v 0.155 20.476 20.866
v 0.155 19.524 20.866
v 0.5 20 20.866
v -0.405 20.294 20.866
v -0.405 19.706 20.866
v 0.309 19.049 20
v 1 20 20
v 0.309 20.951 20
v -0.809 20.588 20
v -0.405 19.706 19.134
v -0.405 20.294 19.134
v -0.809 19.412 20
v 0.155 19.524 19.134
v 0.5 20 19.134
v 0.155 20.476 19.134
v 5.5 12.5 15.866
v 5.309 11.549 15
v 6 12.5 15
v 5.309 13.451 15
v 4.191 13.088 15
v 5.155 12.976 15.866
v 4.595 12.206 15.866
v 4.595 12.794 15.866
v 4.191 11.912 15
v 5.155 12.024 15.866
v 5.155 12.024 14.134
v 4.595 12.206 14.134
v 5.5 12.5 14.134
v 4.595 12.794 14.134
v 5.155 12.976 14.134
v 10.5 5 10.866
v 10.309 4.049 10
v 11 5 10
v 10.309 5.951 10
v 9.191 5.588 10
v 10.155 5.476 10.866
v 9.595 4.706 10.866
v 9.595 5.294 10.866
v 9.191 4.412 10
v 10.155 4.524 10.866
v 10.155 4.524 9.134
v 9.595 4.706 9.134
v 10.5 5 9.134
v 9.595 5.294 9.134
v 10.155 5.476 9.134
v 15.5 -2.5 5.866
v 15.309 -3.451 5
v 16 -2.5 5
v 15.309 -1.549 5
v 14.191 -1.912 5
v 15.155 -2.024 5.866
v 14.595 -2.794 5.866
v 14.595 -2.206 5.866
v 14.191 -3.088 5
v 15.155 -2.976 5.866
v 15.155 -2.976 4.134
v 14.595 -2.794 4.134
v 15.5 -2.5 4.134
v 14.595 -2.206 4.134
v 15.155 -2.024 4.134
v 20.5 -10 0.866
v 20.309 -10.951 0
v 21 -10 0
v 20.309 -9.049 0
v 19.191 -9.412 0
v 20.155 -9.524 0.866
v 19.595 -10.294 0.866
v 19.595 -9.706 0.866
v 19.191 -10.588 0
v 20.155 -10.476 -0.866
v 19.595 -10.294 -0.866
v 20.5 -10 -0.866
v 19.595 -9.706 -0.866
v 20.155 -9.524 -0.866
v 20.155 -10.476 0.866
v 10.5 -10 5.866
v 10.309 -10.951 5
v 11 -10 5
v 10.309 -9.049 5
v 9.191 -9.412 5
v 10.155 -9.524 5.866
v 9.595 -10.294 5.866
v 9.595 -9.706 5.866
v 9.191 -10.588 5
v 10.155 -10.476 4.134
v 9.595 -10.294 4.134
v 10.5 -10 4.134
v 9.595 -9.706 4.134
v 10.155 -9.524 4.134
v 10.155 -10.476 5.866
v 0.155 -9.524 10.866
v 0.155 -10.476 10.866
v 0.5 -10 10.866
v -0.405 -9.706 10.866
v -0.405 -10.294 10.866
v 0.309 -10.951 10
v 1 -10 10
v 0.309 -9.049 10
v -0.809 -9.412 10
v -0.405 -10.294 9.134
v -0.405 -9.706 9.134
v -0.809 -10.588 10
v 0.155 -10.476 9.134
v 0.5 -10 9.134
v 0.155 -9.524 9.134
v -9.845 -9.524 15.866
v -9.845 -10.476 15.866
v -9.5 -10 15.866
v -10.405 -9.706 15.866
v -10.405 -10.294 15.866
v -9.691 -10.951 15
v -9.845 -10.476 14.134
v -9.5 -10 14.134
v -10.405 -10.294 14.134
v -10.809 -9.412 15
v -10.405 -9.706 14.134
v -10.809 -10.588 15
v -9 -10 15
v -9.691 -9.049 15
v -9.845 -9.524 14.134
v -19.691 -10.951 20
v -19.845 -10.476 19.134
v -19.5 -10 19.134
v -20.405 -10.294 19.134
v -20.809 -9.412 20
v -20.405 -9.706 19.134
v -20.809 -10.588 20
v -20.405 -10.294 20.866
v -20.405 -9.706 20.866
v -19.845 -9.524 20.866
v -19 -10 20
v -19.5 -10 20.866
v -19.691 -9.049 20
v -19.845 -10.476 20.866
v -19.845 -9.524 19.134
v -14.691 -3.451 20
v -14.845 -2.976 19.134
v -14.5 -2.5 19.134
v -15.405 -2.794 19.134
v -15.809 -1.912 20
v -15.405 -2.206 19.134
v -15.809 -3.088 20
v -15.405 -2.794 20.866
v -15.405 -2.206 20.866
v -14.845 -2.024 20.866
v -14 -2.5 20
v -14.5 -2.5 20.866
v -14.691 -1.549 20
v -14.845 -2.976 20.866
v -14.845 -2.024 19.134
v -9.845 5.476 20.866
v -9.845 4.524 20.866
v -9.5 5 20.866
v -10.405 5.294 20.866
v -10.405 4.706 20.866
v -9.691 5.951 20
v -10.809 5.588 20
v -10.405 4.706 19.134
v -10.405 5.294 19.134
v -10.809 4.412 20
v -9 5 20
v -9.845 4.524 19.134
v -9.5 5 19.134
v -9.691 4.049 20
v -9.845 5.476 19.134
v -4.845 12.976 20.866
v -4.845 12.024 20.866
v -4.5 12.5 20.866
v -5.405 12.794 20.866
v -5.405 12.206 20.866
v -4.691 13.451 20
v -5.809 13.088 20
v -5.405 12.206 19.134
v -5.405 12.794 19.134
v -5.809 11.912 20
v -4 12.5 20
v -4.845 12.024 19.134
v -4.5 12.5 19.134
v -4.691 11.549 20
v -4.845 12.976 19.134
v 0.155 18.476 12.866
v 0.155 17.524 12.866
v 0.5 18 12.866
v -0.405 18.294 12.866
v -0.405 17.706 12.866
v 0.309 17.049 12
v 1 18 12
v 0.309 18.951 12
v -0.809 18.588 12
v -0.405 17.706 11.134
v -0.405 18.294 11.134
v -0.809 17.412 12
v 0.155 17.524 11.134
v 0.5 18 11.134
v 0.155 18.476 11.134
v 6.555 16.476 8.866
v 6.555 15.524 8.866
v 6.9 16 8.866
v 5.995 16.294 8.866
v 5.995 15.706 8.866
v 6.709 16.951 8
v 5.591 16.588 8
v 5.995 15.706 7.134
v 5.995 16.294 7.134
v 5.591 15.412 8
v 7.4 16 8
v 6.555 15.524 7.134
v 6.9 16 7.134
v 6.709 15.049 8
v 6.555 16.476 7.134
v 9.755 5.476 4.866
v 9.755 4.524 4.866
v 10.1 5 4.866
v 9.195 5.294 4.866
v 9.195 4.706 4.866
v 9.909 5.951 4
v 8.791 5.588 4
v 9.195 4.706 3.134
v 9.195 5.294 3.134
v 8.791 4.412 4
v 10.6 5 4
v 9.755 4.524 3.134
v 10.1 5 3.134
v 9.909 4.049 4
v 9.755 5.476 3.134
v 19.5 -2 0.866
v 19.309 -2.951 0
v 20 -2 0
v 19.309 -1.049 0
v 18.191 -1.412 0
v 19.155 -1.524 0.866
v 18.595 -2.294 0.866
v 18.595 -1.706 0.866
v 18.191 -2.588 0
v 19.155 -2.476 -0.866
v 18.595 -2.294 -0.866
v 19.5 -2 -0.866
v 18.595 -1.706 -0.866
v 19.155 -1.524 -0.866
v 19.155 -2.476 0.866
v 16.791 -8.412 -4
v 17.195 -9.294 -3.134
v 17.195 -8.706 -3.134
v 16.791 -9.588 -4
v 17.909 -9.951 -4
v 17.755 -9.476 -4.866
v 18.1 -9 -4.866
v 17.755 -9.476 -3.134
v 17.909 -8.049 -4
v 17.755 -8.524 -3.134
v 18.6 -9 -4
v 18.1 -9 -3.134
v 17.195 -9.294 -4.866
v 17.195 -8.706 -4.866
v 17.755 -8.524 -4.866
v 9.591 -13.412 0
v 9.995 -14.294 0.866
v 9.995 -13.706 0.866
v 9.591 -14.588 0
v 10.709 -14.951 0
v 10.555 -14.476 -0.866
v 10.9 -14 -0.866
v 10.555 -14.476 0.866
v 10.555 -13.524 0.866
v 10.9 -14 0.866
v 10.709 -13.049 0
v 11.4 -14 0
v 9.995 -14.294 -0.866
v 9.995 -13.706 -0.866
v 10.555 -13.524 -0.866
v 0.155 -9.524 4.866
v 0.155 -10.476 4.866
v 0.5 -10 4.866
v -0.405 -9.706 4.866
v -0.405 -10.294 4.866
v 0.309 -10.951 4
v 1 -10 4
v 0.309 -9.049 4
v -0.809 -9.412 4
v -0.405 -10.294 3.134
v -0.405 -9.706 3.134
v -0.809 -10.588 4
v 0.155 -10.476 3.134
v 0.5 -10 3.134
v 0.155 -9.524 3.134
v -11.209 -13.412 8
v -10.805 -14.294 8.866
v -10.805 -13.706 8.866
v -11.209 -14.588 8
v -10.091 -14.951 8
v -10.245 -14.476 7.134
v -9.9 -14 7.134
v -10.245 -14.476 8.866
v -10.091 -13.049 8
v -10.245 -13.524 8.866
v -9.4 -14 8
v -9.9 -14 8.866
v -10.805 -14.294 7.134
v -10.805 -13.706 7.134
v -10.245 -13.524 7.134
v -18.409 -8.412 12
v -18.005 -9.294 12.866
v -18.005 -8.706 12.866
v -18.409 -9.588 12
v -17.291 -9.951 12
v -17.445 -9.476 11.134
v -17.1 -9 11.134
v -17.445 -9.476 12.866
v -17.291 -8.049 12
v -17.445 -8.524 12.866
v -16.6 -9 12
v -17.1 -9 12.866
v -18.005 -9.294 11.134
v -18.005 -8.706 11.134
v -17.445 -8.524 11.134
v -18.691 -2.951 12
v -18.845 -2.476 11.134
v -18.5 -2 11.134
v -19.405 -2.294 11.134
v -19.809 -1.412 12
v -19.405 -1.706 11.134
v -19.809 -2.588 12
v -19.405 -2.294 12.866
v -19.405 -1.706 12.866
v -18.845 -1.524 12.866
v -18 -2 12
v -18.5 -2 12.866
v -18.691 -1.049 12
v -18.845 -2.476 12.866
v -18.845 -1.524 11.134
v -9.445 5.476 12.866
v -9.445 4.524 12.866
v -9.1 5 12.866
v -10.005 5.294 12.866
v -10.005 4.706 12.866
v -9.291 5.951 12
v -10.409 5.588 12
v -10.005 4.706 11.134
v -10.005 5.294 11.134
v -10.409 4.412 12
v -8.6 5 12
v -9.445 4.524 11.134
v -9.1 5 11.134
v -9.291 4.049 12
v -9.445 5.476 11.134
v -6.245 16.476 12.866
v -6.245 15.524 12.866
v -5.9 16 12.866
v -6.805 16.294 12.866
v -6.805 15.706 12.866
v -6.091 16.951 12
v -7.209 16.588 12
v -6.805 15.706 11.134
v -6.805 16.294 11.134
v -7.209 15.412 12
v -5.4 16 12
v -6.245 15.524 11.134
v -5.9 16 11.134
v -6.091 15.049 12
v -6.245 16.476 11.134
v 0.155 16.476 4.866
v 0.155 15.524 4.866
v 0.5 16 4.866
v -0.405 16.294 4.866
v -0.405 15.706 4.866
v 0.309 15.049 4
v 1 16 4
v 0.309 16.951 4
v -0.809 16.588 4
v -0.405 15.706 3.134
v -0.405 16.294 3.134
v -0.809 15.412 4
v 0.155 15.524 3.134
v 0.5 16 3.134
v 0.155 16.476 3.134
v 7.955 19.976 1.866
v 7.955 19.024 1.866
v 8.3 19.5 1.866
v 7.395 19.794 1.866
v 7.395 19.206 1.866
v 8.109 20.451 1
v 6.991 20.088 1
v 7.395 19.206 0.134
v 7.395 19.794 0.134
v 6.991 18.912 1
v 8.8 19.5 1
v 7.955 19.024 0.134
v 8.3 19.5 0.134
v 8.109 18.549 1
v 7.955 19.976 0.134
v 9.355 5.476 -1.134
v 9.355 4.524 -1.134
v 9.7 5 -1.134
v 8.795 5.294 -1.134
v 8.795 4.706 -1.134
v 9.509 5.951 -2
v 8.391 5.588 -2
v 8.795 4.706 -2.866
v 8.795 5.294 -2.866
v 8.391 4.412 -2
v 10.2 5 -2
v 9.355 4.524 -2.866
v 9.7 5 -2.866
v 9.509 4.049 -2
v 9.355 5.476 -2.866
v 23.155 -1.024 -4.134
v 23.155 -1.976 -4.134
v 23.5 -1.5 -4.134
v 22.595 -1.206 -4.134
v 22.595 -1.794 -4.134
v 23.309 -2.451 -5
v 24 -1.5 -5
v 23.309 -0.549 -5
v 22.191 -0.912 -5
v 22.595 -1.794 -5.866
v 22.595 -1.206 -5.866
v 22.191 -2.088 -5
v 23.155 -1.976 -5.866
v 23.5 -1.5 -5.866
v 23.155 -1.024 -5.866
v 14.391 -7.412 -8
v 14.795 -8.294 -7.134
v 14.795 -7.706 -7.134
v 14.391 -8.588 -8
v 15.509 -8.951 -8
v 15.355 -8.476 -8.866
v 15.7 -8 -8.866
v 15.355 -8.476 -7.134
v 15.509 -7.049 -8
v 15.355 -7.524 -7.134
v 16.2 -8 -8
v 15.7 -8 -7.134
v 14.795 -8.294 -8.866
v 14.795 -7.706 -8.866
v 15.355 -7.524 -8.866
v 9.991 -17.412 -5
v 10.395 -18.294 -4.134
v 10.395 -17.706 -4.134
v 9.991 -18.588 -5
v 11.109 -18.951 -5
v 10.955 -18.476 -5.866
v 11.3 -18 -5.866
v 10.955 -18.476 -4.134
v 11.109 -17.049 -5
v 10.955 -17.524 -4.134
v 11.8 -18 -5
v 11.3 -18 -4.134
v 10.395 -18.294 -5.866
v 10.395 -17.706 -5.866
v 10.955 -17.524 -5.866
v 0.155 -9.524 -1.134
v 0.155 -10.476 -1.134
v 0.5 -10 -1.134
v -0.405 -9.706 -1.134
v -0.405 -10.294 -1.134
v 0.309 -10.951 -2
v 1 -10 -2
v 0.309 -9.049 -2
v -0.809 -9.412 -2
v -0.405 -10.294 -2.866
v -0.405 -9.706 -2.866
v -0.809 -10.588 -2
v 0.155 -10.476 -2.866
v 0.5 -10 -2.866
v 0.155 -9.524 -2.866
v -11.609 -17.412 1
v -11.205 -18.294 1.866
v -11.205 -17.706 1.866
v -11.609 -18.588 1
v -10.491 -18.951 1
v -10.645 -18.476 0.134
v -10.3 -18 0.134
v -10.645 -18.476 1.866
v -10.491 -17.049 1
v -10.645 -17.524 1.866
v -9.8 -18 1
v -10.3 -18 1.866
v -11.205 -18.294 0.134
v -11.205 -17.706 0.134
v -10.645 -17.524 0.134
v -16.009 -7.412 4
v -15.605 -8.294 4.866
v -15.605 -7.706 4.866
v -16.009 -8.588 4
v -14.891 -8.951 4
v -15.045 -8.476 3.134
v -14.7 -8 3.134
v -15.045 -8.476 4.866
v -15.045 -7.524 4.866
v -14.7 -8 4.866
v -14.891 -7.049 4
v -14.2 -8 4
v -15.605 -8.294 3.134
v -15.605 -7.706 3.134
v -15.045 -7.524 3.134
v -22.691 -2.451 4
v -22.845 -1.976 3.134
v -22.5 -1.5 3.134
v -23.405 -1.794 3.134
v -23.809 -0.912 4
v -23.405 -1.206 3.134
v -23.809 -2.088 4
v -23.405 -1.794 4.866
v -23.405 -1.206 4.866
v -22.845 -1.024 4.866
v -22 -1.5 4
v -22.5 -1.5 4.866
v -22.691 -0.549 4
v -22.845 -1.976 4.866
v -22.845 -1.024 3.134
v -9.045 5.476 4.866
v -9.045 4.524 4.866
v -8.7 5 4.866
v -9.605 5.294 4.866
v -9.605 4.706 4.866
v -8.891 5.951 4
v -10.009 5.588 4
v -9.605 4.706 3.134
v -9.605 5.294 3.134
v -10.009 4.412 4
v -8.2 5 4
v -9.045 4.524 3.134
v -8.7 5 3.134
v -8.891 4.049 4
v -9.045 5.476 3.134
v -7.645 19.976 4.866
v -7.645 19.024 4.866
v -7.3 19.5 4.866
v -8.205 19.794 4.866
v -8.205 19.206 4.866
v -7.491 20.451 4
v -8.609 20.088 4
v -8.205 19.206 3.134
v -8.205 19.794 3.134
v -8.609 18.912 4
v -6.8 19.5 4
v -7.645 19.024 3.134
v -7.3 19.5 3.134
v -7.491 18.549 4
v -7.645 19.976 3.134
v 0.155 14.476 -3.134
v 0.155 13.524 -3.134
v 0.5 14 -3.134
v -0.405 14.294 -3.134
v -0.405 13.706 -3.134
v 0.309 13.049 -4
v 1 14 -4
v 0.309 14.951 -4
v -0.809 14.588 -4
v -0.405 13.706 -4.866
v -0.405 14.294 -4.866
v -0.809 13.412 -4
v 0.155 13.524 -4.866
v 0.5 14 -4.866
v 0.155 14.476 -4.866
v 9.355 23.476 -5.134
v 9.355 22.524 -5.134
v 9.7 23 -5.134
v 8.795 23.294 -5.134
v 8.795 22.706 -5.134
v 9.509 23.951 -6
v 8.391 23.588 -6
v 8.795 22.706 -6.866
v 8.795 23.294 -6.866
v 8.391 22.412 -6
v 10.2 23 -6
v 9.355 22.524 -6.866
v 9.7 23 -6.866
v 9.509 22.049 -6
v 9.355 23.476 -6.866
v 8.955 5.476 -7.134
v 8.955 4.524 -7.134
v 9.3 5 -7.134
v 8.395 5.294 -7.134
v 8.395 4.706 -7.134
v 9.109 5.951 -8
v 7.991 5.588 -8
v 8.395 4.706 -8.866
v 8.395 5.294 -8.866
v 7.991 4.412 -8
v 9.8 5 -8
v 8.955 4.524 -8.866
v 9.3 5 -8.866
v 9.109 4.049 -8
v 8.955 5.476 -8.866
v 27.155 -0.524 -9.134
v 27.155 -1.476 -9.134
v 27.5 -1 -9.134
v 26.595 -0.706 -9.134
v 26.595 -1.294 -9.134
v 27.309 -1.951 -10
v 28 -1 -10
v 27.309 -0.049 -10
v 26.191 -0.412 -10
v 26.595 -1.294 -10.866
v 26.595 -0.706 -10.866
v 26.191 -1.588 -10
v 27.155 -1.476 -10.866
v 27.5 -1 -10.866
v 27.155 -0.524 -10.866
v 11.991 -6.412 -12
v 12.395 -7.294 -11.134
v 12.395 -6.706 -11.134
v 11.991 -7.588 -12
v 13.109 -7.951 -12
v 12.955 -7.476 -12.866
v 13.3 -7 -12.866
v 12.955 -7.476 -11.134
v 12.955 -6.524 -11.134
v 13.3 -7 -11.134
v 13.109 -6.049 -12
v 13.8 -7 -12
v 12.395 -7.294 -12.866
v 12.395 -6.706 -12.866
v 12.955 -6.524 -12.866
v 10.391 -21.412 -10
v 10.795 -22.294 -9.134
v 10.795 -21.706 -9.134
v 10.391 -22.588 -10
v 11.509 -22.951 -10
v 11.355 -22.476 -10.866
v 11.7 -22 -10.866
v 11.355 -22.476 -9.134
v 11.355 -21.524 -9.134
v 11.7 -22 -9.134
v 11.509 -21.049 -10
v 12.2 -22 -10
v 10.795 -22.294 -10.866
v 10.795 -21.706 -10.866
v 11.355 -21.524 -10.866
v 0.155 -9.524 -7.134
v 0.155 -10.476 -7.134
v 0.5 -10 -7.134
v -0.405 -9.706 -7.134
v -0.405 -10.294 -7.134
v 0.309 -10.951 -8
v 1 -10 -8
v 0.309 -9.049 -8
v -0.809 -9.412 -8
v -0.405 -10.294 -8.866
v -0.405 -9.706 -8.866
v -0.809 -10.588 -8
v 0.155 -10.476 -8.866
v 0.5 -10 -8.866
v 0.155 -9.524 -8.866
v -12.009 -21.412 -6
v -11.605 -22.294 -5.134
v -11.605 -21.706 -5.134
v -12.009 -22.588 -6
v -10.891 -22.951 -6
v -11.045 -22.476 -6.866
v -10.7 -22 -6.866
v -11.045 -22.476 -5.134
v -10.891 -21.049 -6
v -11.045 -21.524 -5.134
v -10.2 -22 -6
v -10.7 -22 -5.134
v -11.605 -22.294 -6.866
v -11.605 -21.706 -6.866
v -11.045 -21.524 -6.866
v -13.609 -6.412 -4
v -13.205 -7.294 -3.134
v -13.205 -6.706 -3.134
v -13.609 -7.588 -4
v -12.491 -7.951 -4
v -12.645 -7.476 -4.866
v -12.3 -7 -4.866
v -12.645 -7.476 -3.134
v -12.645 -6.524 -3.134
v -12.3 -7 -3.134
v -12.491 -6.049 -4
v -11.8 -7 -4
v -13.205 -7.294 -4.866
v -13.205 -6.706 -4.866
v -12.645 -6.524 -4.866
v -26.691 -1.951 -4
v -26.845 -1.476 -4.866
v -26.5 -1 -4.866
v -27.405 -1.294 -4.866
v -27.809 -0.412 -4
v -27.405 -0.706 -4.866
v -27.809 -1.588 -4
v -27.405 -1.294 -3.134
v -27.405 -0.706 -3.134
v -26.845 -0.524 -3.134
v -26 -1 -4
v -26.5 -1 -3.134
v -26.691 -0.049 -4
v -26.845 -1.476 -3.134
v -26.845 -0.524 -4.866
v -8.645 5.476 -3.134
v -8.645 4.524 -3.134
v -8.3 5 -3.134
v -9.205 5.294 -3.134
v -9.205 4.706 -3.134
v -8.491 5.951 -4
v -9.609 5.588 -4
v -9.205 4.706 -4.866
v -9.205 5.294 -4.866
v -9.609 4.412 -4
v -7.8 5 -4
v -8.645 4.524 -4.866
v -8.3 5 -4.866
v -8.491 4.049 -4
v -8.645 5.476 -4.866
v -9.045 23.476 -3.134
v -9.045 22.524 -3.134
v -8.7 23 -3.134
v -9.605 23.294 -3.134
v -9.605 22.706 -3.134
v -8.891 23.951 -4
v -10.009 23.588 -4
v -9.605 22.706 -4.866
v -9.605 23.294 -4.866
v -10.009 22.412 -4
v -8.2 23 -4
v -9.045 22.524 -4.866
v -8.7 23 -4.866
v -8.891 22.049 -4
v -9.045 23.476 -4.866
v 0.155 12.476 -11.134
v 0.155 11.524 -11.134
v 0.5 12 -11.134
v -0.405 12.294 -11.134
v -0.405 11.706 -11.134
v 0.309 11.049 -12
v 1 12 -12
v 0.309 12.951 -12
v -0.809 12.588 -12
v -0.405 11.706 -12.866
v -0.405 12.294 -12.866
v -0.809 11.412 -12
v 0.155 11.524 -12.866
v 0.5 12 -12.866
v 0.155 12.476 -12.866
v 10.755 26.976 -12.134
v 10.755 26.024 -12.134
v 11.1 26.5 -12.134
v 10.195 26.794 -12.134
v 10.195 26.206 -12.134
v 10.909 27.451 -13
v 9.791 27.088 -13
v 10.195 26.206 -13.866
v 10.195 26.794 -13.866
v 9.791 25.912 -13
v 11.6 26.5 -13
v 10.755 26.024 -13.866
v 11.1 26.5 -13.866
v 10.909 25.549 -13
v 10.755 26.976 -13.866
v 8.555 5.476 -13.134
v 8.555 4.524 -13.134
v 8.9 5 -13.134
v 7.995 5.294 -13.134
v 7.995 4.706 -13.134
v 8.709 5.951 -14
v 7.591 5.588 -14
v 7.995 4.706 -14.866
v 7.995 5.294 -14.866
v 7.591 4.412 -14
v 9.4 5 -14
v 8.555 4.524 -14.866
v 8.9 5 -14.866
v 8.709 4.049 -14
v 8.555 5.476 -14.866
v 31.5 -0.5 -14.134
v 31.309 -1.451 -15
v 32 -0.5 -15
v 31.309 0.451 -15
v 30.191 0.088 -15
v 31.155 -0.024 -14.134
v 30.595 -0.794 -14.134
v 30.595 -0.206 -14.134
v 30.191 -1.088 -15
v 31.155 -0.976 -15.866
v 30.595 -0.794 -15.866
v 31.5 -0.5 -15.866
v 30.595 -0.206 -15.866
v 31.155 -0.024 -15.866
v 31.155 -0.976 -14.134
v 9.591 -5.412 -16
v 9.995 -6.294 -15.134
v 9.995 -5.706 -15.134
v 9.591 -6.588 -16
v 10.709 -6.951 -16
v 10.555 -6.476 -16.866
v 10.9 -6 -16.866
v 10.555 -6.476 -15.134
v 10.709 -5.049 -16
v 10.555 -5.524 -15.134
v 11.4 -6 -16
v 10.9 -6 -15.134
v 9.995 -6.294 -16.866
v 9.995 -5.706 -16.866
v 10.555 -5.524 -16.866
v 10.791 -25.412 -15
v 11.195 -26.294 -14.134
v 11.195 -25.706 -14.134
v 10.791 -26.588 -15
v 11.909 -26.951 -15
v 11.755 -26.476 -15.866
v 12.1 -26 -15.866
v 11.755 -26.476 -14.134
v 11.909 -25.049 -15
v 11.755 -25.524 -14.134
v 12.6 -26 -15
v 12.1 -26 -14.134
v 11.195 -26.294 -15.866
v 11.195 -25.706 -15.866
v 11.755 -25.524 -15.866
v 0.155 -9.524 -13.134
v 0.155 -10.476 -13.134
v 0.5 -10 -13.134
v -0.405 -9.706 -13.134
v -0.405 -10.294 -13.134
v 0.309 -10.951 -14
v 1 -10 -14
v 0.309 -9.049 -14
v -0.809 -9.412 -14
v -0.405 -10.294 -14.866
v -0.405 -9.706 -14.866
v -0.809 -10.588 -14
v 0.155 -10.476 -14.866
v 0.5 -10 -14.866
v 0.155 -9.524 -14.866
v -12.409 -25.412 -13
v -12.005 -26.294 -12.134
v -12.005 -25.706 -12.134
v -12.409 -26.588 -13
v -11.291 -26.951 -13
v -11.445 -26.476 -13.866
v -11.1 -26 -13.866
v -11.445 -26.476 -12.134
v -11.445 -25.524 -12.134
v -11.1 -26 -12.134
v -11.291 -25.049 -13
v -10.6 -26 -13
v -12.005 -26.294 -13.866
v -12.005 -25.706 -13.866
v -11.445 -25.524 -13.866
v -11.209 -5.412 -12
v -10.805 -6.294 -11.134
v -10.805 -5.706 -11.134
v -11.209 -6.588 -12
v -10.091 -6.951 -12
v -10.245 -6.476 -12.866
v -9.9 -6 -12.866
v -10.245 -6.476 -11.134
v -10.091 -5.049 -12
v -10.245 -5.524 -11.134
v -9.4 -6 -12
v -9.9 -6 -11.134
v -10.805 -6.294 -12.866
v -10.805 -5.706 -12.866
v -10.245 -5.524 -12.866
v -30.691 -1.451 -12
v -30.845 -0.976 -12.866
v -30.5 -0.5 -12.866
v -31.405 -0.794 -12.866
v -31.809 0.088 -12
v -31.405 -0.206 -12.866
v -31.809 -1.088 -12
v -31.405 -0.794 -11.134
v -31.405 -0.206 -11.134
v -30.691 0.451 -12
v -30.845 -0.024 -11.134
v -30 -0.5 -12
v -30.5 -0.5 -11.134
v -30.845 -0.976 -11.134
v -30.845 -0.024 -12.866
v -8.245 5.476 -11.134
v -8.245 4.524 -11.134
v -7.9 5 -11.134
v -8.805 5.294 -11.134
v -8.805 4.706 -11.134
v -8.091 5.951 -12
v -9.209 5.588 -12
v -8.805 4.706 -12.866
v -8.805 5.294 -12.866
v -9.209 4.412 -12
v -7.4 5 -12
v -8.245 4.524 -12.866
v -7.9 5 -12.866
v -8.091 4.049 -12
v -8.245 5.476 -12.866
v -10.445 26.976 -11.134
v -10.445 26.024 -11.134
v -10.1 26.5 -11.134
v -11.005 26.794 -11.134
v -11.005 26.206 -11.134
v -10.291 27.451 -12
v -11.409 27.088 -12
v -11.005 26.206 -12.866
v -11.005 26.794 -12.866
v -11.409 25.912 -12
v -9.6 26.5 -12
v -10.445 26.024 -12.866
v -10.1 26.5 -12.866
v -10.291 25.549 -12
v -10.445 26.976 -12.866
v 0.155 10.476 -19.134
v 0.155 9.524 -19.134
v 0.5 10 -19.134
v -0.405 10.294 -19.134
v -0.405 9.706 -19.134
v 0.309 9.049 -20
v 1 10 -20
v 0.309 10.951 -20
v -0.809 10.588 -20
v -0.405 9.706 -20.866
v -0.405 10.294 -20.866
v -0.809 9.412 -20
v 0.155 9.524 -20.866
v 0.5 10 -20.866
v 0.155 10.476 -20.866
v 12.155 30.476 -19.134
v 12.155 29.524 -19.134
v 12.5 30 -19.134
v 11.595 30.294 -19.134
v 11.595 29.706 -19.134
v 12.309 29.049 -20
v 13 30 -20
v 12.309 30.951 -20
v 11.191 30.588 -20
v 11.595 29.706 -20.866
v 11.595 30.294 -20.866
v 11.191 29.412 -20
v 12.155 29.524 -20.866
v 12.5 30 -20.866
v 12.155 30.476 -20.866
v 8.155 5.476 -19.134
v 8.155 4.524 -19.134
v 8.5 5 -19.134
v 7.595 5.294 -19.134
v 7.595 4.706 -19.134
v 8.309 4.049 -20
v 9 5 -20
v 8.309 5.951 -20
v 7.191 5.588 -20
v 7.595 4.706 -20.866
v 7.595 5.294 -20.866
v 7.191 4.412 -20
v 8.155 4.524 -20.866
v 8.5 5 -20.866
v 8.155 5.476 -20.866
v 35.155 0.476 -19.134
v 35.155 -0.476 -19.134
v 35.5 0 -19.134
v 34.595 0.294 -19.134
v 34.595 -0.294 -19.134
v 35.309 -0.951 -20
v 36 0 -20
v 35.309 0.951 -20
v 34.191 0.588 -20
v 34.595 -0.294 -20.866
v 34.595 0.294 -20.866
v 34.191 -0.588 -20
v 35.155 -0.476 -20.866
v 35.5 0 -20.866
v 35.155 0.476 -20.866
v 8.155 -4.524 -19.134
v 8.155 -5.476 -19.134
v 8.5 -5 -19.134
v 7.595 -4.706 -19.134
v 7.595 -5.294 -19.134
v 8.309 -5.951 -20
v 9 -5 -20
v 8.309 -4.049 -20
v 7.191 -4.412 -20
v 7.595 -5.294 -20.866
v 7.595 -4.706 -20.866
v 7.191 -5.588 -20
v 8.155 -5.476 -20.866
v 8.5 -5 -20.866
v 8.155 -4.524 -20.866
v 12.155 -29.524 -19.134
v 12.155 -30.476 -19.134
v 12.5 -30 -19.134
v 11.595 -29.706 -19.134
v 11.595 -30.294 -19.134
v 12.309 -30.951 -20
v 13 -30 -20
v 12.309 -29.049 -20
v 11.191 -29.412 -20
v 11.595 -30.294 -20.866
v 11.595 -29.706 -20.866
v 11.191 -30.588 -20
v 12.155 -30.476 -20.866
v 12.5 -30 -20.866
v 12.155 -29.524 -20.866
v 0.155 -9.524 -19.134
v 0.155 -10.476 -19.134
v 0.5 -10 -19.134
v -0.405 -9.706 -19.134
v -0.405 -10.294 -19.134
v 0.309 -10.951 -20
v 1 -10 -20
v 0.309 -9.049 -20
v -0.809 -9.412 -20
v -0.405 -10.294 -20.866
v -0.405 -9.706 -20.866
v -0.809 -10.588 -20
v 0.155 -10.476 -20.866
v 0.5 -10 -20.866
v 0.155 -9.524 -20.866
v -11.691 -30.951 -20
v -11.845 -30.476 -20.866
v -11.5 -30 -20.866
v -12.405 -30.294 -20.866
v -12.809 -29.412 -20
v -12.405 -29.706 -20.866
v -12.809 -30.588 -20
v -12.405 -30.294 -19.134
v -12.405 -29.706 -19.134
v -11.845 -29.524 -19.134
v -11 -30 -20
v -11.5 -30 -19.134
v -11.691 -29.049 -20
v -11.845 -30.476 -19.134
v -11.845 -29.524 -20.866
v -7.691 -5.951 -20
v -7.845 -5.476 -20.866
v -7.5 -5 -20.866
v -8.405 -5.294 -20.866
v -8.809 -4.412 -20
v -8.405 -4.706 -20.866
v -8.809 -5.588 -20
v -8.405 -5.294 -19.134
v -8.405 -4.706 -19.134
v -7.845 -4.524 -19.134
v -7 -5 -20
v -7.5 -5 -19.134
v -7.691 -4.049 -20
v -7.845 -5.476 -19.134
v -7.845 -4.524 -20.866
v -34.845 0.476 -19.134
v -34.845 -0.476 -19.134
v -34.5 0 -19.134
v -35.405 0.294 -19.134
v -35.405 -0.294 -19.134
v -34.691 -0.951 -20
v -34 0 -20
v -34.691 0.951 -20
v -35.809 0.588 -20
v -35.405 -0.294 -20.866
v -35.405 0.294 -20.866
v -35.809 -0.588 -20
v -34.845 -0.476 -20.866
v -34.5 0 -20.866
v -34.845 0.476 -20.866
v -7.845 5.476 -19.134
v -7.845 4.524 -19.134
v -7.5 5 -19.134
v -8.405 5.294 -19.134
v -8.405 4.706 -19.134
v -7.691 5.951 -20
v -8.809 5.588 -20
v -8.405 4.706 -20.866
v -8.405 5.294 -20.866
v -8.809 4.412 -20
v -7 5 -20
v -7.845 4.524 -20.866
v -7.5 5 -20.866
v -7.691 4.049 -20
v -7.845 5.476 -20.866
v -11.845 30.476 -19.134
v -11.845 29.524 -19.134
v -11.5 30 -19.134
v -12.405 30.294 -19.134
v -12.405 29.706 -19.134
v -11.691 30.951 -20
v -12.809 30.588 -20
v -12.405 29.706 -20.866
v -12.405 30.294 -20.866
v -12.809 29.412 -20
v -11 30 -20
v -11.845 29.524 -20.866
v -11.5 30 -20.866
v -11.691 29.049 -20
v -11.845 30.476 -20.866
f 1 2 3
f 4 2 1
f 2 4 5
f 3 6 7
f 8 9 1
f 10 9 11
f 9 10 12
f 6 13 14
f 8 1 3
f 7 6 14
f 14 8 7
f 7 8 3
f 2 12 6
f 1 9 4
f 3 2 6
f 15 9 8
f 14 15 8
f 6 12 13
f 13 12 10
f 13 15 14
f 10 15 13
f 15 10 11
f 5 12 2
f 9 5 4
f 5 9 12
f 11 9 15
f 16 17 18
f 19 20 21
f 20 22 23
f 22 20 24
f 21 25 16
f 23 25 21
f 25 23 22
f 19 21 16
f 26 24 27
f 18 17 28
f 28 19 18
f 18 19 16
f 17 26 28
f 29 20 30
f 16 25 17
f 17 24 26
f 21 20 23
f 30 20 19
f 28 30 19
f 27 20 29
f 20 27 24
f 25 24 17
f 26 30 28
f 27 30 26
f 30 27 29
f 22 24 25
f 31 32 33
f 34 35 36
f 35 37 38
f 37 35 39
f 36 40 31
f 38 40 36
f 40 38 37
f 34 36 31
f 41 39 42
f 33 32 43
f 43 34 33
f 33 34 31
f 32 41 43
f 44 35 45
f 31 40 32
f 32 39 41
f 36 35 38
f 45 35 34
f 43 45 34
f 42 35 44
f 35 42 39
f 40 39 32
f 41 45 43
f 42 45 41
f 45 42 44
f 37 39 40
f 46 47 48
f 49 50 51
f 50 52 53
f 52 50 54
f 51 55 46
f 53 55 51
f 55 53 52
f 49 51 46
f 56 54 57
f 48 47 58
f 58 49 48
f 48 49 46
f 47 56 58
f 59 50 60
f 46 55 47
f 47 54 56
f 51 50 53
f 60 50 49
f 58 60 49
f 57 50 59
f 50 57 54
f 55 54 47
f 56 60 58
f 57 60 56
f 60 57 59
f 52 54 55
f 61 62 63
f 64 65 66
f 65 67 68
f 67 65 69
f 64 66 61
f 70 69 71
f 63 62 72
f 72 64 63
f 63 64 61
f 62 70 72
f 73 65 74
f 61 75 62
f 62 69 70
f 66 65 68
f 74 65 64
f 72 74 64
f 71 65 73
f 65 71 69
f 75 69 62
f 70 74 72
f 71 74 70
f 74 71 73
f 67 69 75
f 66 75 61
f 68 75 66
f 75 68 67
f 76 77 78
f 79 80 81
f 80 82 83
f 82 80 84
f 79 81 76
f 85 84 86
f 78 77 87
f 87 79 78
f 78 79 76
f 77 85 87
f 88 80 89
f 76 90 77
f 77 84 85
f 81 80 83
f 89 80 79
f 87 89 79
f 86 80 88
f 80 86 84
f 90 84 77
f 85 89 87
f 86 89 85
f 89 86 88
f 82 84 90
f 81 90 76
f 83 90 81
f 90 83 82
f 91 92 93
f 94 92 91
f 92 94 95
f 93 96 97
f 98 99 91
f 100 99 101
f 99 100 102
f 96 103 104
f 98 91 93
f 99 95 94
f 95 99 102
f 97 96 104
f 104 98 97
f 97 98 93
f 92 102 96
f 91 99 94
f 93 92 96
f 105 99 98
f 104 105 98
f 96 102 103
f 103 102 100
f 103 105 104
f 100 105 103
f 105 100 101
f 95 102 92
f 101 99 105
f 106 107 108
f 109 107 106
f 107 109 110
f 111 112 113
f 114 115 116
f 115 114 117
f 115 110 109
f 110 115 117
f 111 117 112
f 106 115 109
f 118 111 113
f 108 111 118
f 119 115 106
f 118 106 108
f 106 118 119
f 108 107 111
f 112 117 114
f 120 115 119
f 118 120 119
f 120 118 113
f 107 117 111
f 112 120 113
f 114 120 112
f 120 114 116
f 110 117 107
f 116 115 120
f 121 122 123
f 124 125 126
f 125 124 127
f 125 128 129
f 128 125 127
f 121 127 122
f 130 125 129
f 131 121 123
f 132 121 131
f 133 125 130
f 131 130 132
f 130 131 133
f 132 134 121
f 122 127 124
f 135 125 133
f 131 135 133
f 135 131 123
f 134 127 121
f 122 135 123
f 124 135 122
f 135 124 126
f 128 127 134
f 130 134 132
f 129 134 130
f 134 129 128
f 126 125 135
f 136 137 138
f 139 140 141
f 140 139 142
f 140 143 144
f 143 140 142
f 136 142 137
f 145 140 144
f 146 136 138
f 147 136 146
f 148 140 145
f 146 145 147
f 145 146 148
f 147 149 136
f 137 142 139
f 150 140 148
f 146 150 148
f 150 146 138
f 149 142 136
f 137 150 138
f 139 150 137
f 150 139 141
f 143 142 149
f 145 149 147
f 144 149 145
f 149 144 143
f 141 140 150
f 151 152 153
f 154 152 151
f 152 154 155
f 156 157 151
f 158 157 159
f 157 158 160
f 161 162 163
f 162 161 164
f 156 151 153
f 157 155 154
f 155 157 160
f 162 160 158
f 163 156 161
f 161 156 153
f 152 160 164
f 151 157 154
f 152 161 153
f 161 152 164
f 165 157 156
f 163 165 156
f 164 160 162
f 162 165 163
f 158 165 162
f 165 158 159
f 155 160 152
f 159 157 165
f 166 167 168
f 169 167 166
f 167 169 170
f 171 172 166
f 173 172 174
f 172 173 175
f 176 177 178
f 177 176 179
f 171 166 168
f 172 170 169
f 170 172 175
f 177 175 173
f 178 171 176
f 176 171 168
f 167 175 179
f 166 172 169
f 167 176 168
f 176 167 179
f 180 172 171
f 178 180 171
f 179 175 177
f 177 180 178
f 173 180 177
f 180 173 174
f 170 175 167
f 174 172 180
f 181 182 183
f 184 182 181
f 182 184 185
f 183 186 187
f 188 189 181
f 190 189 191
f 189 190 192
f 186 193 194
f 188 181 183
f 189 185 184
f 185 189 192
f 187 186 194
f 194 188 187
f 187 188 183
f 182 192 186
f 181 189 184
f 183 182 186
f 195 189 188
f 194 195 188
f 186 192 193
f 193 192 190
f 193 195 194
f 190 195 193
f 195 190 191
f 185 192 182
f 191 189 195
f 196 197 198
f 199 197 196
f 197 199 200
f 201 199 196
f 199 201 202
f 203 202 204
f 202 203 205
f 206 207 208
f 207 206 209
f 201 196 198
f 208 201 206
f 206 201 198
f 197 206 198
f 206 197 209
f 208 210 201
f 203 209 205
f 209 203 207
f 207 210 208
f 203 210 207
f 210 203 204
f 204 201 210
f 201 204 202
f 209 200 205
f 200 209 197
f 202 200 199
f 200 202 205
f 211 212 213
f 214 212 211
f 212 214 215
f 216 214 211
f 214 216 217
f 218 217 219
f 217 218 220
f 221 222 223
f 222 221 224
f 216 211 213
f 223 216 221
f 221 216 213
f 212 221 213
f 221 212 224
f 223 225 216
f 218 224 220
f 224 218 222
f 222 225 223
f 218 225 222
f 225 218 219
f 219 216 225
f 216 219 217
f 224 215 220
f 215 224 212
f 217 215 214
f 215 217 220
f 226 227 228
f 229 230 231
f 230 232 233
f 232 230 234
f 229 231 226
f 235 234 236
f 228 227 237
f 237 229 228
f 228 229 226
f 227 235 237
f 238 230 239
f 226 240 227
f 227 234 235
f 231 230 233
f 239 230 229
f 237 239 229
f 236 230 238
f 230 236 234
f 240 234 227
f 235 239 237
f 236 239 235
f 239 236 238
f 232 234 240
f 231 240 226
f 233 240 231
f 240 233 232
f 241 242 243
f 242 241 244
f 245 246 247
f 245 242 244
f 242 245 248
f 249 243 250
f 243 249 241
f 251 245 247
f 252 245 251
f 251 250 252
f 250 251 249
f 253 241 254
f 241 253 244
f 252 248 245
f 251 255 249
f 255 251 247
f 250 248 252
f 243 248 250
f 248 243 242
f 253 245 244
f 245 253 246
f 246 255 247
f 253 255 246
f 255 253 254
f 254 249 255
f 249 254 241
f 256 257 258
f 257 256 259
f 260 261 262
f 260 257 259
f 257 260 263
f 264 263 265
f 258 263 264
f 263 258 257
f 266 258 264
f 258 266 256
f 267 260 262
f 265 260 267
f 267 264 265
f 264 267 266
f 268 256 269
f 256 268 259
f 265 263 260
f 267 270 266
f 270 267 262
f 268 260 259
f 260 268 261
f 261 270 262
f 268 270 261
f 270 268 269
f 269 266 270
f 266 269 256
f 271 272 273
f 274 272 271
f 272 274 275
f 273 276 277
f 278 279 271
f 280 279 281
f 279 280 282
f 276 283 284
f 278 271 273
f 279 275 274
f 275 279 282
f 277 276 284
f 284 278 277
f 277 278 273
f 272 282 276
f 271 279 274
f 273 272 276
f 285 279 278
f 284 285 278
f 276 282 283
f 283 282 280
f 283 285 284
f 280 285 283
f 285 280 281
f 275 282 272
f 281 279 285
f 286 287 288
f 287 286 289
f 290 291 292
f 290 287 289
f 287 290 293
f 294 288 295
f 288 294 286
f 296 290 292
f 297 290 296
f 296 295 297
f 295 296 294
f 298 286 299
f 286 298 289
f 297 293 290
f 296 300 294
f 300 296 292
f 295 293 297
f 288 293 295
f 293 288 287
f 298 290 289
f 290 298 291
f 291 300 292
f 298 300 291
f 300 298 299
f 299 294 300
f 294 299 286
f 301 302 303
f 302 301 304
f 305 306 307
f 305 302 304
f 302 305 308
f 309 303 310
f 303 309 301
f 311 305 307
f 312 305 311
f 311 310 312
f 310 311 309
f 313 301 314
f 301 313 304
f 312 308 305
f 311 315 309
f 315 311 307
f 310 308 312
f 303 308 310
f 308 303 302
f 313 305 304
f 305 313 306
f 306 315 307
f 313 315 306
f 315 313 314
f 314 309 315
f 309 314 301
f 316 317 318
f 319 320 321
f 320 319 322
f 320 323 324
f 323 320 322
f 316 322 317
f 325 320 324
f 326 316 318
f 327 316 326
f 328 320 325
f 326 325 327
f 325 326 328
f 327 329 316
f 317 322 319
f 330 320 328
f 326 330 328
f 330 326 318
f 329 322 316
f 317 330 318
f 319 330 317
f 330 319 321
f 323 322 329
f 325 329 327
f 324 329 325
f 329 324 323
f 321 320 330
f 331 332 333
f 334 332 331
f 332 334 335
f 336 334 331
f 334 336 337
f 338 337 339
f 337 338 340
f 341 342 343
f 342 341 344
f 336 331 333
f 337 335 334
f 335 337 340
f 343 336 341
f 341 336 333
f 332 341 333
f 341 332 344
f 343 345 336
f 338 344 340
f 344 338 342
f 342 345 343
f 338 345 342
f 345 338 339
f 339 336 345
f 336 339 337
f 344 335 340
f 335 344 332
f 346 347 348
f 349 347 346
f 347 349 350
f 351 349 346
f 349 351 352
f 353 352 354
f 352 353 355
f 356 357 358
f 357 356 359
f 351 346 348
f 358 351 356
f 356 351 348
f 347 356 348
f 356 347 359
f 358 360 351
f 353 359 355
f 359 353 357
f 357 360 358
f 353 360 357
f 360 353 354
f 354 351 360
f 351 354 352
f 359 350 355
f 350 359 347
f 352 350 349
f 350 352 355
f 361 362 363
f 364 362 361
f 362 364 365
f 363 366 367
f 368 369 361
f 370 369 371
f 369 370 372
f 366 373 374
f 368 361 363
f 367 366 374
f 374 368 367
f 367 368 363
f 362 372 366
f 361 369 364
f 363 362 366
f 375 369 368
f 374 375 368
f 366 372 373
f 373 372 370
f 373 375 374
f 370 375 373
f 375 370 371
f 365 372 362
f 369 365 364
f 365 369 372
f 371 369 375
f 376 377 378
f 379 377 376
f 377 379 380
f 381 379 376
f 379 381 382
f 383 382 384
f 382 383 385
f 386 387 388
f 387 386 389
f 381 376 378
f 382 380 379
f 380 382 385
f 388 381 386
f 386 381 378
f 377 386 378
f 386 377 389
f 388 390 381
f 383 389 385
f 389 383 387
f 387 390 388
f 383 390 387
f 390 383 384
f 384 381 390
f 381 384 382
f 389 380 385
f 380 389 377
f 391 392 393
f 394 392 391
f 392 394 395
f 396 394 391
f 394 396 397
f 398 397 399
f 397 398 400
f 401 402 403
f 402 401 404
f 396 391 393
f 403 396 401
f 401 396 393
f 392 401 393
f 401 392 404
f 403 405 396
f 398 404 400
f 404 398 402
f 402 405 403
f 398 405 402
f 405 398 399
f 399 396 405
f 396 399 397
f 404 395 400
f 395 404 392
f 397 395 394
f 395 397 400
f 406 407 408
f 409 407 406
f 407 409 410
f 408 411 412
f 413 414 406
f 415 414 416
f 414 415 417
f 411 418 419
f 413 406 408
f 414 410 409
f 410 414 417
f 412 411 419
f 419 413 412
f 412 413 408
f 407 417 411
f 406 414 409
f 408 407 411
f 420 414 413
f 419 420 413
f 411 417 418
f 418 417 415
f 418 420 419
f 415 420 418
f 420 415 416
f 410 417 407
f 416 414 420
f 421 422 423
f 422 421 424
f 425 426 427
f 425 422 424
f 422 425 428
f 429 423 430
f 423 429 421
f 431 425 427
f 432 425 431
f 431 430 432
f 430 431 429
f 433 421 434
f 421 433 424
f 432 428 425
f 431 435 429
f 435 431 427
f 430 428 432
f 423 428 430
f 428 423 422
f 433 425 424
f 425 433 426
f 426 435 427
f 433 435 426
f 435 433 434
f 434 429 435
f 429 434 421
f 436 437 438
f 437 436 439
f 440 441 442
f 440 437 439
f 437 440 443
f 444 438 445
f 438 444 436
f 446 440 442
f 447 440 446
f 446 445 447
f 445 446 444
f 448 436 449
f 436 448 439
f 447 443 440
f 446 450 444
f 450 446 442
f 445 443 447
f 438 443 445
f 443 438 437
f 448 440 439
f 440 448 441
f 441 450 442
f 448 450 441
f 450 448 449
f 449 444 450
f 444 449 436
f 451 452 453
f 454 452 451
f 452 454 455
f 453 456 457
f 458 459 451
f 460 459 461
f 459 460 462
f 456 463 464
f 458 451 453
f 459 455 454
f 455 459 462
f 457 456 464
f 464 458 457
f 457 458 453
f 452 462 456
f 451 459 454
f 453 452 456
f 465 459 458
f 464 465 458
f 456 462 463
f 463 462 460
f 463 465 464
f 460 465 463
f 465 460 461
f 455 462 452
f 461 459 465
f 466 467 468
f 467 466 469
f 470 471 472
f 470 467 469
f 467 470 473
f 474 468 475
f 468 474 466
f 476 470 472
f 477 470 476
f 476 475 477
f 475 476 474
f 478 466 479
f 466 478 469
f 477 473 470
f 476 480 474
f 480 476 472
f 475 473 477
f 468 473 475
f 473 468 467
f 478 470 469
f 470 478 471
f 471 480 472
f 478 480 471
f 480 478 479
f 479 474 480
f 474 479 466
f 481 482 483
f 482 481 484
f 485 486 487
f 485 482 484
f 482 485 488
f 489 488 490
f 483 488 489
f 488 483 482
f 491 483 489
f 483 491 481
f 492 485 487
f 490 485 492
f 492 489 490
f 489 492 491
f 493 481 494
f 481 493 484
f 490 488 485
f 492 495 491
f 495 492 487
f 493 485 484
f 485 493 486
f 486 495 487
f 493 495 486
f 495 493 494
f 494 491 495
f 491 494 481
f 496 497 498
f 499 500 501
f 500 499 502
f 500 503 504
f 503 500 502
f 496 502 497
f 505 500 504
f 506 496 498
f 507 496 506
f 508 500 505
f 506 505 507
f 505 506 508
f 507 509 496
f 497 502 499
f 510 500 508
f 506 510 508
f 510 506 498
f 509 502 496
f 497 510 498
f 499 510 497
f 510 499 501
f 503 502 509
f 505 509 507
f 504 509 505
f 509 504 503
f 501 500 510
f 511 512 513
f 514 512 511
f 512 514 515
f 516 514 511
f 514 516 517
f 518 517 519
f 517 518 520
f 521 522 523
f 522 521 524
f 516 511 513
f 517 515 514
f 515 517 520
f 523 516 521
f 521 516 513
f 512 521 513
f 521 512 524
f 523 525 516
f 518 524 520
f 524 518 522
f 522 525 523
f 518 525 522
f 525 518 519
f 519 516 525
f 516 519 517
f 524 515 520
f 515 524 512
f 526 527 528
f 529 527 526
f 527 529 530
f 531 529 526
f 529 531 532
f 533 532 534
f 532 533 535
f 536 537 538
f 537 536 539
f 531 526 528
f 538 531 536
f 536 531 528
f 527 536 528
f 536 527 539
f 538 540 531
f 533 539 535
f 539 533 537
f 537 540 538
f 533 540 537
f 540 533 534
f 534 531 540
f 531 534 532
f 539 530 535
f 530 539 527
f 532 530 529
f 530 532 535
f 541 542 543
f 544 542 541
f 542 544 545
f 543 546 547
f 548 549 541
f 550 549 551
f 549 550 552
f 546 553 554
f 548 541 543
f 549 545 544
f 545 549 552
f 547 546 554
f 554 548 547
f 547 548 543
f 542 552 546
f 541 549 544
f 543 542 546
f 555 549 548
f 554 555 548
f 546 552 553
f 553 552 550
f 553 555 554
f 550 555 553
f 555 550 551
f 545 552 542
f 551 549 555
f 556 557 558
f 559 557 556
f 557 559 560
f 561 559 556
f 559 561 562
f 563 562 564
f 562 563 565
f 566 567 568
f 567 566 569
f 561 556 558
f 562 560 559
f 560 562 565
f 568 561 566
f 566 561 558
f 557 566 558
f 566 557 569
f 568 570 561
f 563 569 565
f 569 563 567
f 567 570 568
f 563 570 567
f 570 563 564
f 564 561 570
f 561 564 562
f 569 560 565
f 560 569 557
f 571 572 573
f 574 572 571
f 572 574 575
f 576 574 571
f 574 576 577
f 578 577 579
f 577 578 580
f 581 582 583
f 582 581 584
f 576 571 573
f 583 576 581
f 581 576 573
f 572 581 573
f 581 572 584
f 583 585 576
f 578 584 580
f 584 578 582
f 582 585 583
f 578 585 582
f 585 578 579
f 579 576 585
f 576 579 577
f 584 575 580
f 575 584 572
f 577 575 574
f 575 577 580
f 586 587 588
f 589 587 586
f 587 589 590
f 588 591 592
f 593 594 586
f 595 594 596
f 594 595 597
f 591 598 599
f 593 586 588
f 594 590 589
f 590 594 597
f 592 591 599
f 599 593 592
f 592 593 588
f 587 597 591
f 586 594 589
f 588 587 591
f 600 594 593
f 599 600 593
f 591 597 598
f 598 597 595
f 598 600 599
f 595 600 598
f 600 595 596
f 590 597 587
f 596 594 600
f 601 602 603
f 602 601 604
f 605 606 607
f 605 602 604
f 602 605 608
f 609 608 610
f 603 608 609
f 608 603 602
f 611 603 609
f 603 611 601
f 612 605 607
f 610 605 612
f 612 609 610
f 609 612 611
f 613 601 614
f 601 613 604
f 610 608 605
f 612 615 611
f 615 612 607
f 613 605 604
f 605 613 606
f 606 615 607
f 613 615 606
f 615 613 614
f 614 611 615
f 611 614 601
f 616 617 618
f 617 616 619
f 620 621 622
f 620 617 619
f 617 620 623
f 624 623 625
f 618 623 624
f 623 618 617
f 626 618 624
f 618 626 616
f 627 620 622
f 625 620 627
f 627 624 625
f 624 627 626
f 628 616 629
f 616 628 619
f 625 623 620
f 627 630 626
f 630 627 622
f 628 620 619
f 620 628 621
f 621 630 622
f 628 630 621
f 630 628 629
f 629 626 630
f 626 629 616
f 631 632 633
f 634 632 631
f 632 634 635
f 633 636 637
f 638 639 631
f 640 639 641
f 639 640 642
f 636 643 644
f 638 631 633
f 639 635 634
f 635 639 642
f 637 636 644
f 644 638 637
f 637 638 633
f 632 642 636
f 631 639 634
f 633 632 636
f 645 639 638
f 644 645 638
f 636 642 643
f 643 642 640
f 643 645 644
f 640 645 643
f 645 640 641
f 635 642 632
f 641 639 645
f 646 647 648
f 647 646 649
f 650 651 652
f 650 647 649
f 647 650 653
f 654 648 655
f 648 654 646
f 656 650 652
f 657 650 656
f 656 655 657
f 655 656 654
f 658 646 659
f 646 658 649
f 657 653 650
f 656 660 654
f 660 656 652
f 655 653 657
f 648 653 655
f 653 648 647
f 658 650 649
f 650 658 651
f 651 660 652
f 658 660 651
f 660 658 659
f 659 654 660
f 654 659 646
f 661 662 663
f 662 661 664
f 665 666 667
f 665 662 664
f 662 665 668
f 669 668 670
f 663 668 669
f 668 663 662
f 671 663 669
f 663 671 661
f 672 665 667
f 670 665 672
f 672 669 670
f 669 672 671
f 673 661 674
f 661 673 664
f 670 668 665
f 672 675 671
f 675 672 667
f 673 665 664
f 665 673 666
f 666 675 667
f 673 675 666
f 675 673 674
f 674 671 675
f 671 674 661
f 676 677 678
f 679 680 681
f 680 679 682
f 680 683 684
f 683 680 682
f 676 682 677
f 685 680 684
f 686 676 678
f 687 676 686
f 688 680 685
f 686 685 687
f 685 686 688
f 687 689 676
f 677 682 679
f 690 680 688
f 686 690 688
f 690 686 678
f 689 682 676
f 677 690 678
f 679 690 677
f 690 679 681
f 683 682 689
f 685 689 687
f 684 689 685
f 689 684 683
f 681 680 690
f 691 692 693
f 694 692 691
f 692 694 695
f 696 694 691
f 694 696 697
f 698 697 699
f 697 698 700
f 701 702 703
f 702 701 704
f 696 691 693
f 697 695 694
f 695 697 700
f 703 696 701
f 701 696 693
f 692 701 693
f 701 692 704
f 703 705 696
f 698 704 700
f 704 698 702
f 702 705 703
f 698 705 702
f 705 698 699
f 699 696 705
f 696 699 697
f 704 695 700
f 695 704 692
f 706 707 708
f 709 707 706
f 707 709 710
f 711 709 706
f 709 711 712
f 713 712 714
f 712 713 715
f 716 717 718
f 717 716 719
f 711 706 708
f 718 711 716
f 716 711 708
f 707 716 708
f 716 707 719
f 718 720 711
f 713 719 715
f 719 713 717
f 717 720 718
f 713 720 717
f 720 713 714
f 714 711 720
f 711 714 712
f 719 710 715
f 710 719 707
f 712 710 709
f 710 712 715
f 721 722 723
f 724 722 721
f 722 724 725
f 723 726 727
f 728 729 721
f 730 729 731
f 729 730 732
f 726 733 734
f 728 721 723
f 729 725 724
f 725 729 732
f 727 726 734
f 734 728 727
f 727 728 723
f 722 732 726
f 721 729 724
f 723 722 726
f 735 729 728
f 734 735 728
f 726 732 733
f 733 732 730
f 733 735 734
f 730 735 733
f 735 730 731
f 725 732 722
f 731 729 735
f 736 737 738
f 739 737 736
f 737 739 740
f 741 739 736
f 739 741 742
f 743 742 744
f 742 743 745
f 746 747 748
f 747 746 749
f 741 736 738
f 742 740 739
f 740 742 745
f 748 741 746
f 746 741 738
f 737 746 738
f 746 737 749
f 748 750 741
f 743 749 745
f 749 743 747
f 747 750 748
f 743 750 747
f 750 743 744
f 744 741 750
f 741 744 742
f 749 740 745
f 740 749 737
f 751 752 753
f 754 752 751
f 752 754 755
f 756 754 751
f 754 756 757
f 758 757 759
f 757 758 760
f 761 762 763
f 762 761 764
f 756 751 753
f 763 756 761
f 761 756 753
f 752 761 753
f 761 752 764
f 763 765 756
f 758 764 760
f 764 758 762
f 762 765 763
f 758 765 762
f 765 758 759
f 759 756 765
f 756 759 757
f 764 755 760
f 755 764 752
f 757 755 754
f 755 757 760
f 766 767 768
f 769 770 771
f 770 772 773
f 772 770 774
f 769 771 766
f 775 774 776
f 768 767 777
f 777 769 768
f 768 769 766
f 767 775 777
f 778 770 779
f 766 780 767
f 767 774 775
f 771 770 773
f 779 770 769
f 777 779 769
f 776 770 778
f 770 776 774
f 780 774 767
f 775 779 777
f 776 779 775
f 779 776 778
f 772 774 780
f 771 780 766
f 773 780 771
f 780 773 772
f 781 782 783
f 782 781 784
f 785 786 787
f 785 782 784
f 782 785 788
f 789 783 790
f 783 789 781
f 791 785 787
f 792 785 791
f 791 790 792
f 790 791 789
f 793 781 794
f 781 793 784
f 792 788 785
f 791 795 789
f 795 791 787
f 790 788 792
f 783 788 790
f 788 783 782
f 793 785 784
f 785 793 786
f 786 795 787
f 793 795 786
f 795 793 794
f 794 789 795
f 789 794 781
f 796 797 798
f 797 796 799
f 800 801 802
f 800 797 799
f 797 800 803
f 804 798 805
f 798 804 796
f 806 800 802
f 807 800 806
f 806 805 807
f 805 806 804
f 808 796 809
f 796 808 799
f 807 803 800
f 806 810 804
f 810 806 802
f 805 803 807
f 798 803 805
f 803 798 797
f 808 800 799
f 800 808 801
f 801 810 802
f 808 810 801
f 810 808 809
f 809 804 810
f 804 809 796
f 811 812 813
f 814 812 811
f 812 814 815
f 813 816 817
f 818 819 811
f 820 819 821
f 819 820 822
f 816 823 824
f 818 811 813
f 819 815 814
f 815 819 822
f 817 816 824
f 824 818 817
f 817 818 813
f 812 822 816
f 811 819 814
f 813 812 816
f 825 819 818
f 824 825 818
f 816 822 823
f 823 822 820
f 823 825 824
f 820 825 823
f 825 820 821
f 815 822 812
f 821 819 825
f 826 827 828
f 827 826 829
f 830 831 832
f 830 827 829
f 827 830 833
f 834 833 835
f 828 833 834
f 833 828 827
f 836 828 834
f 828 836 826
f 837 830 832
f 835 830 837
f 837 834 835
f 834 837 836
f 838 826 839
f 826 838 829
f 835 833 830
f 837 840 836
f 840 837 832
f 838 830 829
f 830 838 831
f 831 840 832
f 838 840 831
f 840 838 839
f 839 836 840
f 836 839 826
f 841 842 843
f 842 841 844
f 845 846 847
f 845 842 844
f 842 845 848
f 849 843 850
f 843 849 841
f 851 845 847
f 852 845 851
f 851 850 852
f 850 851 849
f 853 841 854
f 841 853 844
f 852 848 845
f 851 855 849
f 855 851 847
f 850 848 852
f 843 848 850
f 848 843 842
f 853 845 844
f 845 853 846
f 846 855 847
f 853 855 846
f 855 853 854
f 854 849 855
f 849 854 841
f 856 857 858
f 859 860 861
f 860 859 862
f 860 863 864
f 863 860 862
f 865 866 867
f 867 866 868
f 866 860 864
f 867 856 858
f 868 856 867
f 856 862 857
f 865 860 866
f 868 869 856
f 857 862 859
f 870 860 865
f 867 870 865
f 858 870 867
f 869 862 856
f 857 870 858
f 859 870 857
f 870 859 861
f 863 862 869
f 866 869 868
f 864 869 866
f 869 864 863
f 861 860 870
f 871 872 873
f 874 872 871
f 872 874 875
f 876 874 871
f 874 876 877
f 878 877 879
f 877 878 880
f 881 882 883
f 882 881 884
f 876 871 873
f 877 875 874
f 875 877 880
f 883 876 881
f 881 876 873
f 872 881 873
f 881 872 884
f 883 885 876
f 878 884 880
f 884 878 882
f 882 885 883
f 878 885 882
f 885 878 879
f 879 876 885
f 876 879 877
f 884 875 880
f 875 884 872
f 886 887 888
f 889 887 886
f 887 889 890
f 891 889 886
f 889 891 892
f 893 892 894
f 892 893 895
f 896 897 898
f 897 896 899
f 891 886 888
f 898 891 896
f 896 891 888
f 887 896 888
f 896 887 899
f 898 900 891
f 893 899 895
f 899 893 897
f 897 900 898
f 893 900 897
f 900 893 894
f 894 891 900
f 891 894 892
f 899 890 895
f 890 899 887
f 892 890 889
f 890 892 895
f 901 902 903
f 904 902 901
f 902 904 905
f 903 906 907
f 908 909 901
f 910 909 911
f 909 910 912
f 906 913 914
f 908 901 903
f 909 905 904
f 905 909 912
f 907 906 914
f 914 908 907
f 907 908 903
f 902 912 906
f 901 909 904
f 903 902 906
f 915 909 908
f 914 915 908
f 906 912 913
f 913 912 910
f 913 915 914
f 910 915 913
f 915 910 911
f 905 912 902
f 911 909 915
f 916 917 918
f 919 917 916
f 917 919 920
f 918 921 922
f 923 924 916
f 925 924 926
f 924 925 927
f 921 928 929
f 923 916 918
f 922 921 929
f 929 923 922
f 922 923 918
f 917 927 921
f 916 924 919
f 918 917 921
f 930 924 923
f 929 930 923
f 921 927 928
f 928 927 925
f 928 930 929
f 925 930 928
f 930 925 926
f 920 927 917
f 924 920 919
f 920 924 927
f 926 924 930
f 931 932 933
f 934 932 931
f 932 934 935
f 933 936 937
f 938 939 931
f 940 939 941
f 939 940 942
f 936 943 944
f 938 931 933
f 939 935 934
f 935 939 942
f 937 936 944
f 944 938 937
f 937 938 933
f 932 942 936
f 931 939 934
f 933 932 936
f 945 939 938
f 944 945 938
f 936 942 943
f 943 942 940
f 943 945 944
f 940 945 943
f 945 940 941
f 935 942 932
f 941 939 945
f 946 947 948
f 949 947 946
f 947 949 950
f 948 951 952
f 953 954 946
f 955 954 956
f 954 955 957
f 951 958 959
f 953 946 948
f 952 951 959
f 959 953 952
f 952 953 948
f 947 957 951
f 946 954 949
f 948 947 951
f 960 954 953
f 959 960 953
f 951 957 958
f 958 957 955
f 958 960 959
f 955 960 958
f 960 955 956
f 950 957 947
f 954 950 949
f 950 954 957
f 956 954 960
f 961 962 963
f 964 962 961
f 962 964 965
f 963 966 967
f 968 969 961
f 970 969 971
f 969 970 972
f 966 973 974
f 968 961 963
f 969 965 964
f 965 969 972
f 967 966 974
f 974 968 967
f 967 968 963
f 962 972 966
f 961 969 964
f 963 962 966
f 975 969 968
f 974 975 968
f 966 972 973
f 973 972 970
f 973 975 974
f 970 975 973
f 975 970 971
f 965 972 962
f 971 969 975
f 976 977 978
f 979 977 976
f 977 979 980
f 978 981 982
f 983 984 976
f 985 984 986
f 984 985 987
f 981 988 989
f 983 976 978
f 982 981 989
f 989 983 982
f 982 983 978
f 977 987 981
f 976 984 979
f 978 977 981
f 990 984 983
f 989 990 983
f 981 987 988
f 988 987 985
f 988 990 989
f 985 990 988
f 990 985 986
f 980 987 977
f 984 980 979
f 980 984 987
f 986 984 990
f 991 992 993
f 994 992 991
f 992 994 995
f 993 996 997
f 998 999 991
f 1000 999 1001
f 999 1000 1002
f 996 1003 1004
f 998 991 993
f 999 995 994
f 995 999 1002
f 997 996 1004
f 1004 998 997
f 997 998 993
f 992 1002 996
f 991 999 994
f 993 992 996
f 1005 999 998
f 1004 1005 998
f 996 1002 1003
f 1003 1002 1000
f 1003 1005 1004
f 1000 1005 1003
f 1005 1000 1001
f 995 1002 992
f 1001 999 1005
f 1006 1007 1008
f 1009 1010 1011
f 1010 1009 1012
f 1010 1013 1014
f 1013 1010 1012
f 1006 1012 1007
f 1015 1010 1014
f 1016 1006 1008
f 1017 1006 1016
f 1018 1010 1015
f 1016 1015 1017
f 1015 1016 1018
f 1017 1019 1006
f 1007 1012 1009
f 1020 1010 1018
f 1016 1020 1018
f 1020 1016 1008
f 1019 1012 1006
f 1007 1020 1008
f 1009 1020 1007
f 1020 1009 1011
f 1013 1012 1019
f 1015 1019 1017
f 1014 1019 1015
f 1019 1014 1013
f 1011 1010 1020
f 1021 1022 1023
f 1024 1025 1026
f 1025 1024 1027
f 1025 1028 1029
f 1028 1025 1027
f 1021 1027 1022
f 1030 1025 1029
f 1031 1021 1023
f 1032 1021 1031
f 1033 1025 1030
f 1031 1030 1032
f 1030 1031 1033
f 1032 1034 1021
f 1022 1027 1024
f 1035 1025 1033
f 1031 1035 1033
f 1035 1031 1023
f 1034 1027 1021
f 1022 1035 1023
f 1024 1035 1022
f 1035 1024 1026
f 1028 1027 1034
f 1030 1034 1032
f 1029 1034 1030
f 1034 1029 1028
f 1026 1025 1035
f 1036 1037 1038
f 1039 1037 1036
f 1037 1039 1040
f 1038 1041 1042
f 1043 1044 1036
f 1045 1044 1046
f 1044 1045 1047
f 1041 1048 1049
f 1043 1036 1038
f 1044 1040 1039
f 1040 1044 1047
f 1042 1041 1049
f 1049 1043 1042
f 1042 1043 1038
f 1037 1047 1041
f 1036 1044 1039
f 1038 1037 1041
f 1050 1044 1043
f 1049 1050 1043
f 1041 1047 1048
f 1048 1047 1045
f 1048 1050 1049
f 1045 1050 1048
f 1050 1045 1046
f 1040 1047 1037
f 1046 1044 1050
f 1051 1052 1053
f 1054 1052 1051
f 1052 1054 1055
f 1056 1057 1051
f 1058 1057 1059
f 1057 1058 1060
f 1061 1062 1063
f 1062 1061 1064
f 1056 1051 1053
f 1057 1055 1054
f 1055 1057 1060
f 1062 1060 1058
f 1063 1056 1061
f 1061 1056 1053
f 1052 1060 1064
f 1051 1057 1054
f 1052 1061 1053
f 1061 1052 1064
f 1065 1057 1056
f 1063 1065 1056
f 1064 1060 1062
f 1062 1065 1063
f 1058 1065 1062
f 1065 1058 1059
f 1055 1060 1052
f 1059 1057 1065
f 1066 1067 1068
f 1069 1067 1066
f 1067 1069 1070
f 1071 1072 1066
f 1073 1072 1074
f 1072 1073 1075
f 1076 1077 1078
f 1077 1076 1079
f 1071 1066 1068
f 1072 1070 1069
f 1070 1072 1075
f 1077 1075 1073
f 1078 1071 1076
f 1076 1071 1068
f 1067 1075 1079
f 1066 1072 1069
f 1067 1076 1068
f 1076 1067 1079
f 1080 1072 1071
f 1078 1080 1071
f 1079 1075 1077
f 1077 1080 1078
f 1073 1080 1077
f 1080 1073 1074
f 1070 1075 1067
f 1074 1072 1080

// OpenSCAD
// OpenSCAD loft demo, with n layers.

// Add the same amount of points for upper and lower face,
// preferably clockwise (looking from above).
// If those things are unclear, try combinations 
// of upper/lower, clockwise/counterclockwise.
// Start over matching points, otherwise the polyhedron will be twisted.
// It is possible defining the points by code.

my_upper_points = [ [0,20,20], [5,12.5,15], [10,5,10], [15,-2.5,5], 
        [20,-10,0], [10,-10,5], [0,-10,10], [-10,-10,15],       
        [-20,-10,20], [-15,-2.5,20], [-10,5,20], [-5,12.5,20] ];   
my_lower_points = [ [0,10,-20], [12,30,-20], [8,5,-20], [35,0,-20], 
        [8,-5,-20], [12,-30,-20], [0,-10,-20], [-12,-30,-20], 
        [-8,-5,-20], [-35,0,-20], [-8,5,-20], [-12,30,-20] ];     
        
// More layers make it smoother and harder to calculate.
number_of_layers = 5 ;   

loft_edge_point_numbers = len(my_upper_points);   
echo(loft_edge_point_numbers = loft_edge_point_numbers);

function even_average(number_point, index_point, number_of_layers, this_layer) = 
    ((my_upper_points[number_point][index_point] * (number_of_layers - this_layer) / number_of_layers)
    + (my_lower_points[number_point][index_point] * this_layer / number_of_layers)
    );
           
points = [
    for (i = [0 : number_of_layers])
        for (j = [0 : loft_edge_point_numbers - 1])
            [even_average(j, 0, number_of_layers, i),
            even_average(j, 1, number_of_layers, i),
            even_average(j, 2, number_of_layers, i)]
];    
//echo(points = points);

faces = [
    [for (i= [0 : loft_edge_point_numbers-1]) i], // Upper plane.
    for (i = [0 : number_of_layers -1])
        for (j = [0 : loft_edge_point_numbers - 1]) // Towards lower points.
            [loft_edge_point_numbers * i + (j+1)%loft_edge_point_numbers, 
            loft_edge_point_numbers * i + j, 
            loft_edge_point_numbers * (i+1) + j],
    for (i = [1 : number_of_layers])
        for (j = [0 : loft_edge_point_numbers - 1]) // Towards upper points.
            [loft_edge_point_numbers * i + j, 
            loft_edge_point_numbers * i + (j+1) % loft_edge_point_numbers, 
            loft_edge_point_numbers * (i-1) + (j+1) % loft_edge_point_numbers],
    [for (i= [(loft_edge_point_numbers) * (number_of_layers+1) -1  : -1 : loft_edge_point_numbers * number_of_layers ]) i], // Lower plane.
];
//echo(faces = faces);
    
module loft(upper_points, lower_points, number_of_layers)   
polyhedron( 
    points = points,
    faces = faces
);

%loft(my_upper_points, my_lower_points, number_of_layers);

// Colorful dots on every point, for depugging purposes.
many_colors = 20;                // Choose as you like, influences the rainbow.
size_debug_sphere = 1;          // Depends on the size of your model.
        
for (i= [0 : (loft_edge_point_numbers) * (number_of_layers+1) -1 ])
    color([cos(many_colors*i)/2+0.5, 
        -sin(many_colors*i)/2+0.5, 
        -cos(many_colors*i)/2+0.5, 
        1])
    translate(points[i]) sphere(size_debug_sphere);

echo(version = version());
